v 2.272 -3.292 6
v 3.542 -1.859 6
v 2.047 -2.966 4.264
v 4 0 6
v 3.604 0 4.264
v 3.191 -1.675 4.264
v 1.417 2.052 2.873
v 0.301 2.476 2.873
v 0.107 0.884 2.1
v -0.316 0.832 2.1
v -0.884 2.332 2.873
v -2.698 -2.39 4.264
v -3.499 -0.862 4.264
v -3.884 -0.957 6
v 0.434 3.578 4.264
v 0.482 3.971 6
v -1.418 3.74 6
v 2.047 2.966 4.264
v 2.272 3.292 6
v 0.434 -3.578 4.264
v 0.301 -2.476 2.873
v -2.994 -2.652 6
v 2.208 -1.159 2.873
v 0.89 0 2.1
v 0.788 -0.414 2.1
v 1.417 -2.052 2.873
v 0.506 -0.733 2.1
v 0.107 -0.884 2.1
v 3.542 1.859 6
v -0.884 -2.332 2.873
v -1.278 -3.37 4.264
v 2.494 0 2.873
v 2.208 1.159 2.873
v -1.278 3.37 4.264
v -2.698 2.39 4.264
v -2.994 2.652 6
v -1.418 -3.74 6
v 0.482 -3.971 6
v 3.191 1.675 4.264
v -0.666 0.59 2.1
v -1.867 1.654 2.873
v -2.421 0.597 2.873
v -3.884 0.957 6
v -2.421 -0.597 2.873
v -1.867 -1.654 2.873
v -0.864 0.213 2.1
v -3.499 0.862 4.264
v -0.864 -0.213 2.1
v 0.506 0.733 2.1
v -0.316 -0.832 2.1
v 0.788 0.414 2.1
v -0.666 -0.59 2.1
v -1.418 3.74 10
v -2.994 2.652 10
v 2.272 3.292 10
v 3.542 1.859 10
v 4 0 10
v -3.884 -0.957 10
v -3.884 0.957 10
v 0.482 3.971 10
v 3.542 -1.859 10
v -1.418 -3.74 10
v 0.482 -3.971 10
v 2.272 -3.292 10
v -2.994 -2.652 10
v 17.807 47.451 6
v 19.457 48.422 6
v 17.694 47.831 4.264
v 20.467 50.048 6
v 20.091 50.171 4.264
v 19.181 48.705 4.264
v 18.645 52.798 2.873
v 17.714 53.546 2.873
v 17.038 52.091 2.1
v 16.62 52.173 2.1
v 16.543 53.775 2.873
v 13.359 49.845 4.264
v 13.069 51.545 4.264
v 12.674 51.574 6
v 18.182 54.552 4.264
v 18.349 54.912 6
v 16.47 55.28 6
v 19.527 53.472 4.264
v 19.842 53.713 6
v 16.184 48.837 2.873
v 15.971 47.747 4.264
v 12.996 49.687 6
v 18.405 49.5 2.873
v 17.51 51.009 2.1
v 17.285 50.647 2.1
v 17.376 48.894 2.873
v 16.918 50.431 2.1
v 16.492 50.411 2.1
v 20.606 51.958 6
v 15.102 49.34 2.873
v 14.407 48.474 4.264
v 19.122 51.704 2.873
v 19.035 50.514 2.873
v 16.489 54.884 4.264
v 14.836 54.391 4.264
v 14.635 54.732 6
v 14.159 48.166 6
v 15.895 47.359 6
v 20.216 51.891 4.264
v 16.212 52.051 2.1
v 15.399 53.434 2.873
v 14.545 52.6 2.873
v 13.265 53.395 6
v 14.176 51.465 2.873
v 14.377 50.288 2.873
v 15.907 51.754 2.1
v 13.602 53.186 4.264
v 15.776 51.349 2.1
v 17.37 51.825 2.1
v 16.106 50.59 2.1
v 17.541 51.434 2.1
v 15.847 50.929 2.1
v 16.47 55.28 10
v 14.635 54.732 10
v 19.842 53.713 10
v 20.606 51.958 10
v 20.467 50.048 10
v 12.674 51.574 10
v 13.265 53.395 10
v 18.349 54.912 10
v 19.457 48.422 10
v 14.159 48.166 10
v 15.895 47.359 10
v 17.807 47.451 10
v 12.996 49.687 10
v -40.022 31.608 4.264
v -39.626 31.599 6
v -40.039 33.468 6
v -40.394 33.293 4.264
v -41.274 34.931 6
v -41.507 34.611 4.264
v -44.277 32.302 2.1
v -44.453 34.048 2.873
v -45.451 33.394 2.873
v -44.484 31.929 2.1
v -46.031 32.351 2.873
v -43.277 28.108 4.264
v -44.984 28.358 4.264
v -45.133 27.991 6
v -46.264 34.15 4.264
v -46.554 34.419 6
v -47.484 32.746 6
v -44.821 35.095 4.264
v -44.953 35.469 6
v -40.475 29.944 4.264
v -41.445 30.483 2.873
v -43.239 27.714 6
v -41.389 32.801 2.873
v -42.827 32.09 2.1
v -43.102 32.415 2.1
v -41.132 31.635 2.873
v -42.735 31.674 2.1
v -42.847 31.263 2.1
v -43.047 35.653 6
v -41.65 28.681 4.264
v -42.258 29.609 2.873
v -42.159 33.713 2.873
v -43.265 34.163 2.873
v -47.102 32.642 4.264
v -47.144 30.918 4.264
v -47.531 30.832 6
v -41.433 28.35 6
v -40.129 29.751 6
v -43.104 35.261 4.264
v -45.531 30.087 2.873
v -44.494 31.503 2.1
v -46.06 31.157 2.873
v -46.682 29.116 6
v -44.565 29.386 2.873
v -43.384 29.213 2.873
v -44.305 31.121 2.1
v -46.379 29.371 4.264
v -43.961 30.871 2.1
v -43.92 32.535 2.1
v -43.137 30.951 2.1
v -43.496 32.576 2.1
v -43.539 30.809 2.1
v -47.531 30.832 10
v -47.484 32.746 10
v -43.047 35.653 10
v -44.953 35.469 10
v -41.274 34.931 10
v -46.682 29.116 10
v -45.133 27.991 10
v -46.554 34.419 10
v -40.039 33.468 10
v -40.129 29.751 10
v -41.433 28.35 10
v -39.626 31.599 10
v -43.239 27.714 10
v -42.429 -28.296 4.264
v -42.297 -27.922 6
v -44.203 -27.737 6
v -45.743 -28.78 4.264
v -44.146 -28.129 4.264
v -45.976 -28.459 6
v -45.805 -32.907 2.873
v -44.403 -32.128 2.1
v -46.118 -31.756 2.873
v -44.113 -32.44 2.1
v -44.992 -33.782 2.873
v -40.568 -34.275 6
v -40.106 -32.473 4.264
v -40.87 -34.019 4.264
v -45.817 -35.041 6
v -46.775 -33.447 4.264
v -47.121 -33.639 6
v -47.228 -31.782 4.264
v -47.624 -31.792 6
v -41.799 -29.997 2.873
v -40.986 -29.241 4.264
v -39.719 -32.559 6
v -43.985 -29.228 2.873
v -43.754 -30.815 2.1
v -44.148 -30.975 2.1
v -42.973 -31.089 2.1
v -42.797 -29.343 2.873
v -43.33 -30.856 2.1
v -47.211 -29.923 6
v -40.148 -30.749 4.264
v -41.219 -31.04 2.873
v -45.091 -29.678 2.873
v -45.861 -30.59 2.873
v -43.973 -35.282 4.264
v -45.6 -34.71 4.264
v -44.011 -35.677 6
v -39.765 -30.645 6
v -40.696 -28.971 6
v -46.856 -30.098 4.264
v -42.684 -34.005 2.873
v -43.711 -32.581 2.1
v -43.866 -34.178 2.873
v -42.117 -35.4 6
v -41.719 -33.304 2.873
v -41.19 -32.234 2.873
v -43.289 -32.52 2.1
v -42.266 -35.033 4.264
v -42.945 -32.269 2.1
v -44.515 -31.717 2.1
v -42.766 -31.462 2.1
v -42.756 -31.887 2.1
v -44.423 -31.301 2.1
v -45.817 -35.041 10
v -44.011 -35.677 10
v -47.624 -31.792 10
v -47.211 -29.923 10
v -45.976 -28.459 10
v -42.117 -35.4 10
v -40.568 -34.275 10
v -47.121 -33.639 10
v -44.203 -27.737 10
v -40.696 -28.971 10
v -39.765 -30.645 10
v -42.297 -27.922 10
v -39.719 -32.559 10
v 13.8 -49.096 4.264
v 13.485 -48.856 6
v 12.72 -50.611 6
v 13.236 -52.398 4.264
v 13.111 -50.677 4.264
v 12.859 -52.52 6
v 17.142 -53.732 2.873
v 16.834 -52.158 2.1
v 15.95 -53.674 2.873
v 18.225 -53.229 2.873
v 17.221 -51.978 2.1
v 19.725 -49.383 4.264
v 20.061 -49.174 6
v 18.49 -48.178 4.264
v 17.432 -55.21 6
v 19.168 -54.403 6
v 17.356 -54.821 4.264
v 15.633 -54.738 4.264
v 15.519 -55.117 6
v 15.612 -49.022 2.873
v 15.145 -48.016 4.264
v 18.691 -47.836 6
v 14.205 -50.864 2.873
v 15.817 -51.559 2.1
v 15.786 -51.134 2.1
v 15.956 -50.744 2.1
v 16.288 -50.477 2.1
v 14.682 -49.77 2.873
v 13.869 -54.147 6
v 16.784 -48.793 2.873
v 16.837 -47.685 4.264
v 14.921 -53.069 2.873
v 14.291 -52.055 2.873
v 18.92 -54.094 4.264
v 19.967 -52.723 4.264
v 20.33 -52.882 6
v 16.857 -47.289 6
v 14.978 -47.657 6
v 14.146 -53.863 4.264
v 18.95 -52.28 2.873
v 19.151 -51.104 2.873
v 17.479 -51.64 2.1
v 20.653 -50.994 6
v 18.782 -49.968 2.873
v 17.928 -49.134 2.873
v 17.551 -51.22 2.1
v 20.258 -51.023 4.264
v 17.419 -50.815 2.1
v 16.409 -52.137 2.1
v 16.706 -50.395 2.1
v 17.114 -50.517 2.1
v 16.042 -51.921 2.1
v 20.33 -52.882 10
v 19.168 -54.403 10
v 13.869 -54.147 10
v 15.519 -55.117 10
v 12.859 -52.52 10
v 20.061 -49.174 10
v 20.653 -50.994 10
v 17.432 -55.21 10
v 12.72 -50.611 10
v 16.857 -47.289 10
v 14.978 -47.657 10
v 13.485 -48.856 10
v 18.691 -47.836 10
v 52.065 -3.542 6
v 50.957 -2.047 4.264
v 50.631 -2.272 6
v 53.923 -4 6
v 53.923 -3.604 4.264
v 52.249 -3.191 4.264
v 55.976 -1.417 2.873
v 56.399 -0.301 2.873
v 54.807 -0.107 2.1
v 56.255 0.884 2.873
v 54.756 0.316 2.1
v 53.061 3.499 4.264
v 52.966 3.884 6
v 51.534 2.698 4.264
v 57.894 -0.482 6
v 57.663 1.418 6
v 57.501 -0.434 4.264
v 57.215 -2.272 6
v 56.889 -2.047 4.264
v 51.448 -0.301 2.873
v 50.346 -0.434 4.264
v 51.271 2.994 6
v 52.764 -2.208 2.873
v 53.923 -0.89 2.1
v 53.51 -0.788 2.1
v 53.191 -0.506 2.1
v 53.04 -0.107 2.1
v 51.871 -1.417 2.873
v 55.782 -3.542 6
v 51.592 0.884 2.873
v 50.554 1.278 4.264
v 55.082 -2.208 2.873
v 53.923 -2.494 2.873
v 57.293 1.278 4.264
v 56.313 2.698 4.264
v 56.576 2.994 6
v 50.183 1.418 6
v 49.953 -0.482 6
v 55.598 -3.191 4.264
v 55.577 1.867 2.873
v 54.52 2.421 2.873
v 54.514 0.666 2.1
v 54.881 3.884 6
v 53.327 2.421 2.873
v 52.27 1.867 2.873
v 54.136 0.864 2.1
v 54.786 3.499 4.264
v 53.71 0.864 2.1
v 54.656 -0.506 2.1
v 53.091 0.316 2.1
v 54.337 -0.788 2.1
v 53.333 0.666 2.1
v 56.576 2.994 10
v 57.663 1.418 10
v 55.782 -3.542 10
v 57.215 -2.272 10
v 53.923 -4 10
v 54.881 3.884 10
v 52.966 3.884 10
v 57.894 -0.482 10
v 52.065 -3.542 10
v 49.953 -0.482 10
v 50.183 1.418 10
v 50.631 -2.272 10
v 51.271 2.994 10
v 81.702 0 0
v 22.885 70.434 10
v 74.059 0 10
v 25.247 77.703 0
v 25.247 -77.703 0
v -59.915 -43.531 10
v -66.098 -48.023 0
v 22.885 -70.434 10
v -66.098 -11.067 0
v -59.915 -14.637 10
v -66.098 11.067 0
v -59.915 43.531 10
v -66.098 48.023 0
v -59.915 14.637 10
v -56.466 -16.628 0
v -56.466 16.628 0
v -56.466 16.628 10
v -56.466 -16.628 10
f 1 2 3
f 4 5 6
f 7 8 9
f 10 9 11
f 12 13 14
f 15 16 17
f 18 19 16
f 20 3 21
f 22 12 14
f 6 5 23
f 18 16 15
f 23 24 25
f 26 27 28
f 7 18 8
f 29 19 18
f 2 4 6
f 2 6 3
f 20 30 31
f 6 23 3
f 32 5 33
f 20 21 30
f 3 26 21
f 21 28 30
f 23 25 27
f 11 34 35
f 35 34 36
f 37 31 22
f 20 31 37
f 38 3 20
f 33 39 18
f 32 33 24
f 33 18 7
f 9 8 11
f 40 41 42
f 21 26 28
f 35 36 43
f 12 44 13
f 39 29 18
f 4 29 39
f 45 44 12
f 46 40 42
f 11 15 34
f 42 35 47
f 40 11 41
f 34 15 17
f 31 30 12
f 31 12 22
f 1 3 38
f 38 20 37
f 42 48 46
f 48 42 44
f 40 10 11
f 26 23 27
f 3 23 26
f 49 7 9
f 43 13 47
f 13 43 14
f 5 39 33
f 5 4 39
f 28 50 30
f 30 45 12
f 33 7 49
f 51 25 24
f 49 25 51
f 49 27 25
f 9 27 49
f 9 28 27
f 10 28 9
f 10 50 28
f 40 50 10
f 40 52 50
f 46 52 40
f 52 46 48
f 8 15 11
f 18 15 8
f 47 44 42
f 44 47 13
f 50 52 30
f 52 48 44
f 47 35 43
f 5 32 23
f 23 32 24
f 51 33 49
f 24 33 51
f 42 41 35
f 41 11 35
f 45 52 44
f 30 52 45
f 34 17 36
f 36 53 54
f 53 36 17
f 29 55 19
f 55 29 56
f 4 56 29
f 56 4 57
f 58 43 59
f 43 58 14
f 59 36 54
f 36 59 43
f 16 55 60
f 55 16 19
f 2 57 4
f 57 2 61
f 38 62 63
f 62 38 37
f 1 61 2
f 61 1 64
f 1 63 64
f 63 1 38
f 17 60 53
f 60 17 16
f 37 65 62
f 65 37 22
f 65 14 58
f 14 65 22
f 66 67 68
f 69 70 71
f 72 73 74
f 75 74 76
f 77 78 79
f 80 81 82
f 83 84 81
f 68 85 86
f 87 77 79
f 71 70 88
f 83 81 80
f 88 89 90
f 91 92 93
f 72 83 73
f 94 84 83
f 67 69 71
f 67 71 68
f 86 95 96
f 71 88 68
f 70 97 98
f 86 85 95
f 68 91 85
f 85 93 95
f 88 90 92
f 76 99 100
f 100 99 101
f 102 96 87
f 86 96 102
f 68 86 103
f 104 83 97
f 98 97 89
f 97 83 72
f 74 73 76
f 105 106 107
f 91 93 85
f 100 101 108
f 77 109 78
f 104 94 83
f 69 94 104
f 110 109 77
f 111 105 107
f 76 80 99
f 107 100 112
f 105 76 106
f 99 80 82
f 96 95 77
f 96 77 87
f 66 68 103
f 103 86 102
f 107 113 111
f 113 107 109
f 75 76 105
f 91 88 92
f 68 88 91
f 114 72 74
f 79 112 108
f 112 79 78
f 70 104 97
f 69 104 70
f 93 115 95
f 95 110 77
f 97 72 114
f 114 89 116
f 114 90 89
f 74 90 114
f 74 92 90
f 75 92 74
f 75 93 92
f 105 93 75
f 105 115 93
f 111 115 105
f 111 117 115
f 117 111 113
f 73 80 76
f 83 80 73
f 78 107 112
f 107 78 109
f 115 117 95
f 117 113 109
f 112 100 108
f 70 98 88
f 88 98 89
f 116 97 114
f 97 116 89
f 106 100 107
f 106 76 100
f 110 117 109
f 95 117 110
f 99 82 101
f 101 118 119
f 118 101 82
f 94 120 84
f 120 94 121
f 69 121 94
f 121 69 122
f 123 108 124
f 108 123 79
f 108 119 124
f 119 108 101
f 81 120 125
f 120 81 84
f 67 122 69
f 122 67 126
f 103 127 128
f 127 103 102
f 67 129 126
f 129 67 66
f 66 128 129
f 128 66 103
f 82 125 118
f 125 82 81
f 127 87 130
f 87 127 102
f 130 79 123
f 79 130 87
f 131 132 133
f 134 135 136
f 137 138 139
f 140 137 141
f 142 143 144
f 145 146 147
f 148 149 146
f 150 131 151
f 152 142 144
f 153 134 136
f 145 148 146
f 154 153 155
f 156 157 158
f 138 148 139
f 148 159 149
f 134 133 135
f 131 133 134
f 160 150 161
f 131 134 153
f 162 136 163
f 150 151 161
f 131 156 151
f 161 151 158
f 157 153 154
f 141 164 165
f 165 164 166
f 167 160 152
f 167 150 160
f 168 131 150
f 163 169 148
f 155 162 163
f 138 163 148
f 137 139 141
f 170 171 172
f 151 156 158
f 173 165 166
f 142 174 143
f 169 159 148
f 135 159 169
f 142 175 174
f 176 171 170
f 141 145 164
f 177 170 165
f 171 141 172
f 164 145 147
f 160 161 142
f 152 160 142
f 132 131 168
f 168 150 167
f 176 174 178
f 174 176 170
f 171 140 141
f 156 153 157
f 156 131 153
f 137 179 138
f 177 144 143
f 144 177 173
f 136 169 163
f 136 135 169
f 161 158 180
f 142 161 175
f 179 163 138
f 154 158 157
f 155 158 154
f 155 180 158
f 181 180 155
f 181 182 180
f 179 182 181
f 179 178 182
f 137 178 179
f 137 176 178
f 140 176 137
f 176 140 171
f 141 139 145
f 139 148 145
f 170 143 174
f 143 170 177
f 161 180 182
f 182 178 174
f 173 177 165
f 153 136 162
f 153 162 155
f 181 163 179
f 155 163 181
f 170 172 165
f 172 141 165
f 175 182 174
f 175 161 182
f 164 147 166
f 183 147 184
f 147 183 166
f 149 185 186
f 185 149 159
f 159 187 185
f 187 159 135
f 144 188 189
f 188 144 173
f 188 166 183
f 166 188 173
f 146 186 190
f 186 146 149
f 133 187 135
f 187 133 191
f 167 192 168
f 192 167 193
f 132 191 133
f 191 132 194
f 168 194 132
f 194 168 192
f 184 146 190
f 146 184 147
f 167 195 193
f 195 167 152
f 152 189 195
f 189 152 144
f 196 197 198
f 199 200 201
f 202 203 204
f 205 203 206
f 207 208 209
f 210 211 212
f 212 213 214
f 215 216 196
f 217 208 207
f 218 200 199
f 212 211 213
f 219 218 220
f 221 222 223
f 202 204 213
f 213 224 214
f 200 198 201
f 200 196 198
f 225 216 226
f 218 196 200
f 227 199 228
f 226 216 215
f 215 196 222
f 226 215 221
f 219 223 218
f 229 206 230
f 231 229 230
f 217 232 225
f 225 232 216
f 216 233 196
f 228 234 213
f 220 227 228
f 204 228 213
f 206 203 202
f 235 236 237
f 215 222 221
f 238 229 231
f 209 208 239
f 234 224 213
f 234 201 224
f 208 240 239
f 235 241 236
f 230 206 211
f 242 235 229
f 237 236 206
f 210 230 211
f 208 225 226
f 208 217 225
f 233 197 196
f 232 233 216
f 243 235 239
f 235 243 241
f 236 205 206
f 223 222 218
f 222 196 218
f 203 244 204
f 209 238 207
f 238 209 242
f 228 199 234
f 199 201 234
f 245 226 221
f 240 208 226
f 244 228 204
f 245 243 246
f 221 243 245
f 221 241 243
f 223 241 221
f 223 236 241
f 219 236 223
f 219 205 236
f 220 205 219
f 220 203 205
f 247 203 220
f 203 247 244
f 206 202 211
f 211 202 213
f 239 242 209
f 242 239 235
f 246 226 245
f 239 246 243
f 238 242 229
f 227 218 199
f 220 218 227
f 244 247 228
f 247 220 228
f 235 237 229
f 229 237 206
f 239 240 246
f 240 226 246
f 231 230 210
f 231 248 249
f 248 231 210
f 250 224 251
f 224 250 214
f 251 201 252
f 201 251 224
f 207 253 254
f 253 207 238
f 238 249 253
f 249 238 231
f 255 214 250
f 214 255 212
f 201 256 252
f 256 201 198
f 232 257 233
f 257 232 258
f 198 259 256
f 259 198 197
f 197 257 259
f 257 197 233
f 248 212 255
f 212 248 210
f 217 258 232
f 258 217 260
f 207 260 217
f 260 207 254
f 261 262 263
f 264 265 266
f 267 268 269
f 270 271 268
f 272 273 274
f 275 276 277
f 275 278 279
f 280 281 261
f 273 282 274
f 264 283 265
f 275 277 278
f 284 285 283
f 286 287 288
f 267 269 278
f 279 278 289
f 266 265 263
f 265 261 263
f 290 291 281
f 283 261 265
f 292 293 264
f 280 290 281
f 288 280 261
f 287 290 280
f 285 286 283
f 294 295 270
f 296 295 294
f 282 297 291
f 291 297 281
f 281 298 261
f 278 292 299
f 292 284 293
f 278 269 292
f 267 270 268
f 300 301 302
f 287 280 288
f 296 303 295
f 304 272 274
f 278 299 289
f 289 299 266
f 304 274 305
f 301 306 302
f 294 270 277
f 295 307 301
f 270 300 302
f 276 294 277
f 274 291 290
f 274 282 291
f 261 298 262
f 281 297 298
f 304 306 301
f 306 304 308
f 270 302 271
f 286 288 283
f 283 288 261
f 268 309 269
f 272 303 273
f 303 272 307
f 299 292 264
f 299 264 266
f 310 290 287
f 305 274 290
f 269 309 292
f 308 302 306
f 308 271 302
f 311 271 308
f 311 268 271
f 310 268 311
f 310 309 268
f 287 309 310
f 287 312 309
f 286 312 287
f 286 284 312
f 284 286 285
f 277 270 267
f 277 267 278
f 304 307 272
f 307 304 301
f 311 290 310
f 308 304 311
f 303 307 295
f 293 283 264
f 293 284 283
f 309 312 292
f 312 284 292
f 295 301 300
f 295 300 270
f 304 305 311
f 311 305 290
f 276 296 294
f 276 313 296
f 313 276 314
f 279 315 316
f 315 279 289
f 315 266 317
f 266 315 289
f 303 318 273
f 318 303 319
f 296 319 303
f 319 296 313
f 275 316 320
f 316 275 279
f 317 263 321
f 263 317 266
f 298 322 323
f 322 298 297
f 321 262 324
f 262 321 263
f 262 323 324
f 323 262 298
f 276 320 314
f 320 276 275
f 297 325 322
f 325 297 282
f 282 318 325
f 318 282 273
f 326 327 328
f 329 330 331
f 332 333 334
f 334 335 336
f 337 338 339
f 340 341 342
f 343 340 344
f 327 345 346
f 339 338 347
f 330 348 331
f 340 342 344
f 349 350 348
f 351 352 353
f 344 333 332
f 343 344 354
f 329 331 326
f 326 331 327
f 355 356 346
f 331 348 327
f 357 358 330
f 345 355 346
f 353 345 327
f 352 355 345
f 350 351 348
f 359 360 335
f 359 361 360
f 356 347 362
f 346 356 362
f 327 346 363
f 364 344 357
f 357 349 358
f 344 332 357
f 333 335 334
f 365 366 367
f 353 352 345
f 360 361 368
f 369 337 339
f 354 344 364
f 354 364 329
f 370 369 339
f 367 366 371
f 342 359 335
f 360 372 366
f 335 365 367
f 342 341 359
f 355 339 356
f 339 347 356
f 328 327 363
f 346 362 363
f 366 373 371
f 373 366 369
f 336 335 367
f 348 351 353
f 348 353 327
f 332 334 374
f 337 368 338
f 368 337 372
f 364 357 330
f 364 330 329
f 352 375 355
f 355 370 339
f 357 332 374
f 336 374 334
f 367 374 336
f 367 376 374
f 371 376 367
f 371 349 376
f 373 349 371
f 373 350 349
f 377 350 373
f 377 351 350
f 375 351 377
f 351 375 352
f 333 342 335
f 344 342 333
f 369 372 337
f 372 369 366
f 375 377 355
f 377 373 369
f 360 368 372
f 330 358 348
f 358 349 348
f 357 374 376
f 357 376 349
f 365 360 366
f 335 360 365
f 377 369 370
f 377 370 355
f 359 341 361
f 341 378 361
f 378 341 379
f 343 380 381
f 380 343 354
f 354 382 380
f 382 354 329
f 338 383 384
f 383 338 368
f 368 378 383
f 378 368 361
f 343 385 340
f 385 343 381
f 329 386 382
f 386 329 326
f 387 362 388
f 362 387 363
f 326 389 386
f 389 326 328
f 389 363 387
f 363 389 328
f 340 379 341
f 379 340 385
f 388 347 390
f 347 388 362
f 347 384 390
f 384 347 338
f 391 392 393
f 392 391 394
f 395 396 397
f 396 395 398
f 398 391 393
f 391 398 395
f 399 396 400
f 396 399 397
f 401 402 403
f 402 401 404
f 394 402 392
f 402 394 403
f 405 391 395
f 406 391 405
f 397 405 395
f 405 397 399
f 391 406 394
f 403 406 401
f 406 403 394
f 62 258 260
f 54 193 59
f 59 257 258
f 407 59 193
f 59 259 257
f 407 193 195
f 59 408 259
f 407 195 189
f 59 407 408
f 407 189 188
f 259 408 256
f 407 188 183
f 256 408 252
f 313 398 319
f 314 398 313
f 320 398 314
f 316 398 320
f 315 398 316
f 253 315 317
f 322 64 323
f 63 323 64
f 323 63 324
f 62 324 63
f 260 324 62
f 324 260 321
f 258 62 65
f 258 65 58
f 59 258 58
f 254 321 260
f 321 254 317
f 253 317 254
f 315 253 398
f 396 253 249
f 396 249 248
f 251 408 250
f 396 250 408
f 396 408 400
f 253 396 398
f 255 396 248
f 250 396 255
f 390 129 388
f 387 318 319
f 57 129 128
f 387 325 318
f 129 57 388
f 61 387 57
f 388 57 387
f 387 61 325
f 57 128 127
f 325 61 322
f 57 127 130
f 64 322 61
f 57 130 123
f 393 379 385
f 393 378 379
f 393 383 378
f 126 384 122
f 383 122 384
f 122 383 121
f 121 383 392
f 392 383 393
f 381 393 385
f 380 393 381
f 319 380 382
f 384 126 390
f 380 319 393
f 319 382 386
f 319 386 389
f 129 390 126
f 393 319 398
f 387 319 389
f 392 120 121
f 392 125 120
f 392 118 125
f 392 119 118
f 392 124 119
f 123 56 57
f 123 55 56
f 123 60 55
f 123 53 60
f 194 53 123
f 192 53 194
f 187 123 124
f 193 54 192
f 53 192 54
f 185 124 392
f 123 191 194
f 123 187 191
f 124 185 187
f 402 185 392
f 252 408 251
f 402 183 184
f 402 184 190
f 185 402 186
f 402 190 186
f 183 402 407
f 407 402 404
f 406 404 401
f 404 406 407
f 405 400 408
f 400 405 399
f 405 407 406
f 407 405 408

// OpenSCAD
$side_length = 96;

$radius = $side_length / 1.175;
$inradius = $side_length / (2*tan(36));

$thickness = 10;
$thinness = 1;

$temp_height = $side_length * 1.1135;

module led() {
  sphere(d=8);
  cylinder(5,4,4);
  translate([0,0,5]) {
    cylinder(2,9.25/2,9.25/2);
  }
}

    difference() {
    //create the hexagon
            cylinder(h = $temp_height,
               r1 = $radius,
               r2 = 0,
               $fn = 5);
        
      translate([0,0,$thickness]) {
        cylinder(h = $temp_height,
        r1 = $radius,
        r2 = 0,
        $fn = 5);
      }    
    
  //punch out the center led
  translate([0,0,5 + $thinness]) {
    led();
  }
  
  // punch out the 5 ledsaround the edge.
  rotate([0,0,-18]) {
    for(i = [0 : 4]) {
      rotate([0,0,(360/5)*i]) {
        translate([0,$radius*0.66,5 + $thinness]) {
          led();
        }
      }
    }
  }
  
  // punch out a butterfly dado
    $dado_length = $side_length/5;
    translate([-$inradius,0,-1]) {
      rotate([0,0,60]) {
        cylinder(h = $thickness+2,
        r1 = $dado_length,
        r2 = $dado_length,
        $fn = 3);
    }
  }
}
